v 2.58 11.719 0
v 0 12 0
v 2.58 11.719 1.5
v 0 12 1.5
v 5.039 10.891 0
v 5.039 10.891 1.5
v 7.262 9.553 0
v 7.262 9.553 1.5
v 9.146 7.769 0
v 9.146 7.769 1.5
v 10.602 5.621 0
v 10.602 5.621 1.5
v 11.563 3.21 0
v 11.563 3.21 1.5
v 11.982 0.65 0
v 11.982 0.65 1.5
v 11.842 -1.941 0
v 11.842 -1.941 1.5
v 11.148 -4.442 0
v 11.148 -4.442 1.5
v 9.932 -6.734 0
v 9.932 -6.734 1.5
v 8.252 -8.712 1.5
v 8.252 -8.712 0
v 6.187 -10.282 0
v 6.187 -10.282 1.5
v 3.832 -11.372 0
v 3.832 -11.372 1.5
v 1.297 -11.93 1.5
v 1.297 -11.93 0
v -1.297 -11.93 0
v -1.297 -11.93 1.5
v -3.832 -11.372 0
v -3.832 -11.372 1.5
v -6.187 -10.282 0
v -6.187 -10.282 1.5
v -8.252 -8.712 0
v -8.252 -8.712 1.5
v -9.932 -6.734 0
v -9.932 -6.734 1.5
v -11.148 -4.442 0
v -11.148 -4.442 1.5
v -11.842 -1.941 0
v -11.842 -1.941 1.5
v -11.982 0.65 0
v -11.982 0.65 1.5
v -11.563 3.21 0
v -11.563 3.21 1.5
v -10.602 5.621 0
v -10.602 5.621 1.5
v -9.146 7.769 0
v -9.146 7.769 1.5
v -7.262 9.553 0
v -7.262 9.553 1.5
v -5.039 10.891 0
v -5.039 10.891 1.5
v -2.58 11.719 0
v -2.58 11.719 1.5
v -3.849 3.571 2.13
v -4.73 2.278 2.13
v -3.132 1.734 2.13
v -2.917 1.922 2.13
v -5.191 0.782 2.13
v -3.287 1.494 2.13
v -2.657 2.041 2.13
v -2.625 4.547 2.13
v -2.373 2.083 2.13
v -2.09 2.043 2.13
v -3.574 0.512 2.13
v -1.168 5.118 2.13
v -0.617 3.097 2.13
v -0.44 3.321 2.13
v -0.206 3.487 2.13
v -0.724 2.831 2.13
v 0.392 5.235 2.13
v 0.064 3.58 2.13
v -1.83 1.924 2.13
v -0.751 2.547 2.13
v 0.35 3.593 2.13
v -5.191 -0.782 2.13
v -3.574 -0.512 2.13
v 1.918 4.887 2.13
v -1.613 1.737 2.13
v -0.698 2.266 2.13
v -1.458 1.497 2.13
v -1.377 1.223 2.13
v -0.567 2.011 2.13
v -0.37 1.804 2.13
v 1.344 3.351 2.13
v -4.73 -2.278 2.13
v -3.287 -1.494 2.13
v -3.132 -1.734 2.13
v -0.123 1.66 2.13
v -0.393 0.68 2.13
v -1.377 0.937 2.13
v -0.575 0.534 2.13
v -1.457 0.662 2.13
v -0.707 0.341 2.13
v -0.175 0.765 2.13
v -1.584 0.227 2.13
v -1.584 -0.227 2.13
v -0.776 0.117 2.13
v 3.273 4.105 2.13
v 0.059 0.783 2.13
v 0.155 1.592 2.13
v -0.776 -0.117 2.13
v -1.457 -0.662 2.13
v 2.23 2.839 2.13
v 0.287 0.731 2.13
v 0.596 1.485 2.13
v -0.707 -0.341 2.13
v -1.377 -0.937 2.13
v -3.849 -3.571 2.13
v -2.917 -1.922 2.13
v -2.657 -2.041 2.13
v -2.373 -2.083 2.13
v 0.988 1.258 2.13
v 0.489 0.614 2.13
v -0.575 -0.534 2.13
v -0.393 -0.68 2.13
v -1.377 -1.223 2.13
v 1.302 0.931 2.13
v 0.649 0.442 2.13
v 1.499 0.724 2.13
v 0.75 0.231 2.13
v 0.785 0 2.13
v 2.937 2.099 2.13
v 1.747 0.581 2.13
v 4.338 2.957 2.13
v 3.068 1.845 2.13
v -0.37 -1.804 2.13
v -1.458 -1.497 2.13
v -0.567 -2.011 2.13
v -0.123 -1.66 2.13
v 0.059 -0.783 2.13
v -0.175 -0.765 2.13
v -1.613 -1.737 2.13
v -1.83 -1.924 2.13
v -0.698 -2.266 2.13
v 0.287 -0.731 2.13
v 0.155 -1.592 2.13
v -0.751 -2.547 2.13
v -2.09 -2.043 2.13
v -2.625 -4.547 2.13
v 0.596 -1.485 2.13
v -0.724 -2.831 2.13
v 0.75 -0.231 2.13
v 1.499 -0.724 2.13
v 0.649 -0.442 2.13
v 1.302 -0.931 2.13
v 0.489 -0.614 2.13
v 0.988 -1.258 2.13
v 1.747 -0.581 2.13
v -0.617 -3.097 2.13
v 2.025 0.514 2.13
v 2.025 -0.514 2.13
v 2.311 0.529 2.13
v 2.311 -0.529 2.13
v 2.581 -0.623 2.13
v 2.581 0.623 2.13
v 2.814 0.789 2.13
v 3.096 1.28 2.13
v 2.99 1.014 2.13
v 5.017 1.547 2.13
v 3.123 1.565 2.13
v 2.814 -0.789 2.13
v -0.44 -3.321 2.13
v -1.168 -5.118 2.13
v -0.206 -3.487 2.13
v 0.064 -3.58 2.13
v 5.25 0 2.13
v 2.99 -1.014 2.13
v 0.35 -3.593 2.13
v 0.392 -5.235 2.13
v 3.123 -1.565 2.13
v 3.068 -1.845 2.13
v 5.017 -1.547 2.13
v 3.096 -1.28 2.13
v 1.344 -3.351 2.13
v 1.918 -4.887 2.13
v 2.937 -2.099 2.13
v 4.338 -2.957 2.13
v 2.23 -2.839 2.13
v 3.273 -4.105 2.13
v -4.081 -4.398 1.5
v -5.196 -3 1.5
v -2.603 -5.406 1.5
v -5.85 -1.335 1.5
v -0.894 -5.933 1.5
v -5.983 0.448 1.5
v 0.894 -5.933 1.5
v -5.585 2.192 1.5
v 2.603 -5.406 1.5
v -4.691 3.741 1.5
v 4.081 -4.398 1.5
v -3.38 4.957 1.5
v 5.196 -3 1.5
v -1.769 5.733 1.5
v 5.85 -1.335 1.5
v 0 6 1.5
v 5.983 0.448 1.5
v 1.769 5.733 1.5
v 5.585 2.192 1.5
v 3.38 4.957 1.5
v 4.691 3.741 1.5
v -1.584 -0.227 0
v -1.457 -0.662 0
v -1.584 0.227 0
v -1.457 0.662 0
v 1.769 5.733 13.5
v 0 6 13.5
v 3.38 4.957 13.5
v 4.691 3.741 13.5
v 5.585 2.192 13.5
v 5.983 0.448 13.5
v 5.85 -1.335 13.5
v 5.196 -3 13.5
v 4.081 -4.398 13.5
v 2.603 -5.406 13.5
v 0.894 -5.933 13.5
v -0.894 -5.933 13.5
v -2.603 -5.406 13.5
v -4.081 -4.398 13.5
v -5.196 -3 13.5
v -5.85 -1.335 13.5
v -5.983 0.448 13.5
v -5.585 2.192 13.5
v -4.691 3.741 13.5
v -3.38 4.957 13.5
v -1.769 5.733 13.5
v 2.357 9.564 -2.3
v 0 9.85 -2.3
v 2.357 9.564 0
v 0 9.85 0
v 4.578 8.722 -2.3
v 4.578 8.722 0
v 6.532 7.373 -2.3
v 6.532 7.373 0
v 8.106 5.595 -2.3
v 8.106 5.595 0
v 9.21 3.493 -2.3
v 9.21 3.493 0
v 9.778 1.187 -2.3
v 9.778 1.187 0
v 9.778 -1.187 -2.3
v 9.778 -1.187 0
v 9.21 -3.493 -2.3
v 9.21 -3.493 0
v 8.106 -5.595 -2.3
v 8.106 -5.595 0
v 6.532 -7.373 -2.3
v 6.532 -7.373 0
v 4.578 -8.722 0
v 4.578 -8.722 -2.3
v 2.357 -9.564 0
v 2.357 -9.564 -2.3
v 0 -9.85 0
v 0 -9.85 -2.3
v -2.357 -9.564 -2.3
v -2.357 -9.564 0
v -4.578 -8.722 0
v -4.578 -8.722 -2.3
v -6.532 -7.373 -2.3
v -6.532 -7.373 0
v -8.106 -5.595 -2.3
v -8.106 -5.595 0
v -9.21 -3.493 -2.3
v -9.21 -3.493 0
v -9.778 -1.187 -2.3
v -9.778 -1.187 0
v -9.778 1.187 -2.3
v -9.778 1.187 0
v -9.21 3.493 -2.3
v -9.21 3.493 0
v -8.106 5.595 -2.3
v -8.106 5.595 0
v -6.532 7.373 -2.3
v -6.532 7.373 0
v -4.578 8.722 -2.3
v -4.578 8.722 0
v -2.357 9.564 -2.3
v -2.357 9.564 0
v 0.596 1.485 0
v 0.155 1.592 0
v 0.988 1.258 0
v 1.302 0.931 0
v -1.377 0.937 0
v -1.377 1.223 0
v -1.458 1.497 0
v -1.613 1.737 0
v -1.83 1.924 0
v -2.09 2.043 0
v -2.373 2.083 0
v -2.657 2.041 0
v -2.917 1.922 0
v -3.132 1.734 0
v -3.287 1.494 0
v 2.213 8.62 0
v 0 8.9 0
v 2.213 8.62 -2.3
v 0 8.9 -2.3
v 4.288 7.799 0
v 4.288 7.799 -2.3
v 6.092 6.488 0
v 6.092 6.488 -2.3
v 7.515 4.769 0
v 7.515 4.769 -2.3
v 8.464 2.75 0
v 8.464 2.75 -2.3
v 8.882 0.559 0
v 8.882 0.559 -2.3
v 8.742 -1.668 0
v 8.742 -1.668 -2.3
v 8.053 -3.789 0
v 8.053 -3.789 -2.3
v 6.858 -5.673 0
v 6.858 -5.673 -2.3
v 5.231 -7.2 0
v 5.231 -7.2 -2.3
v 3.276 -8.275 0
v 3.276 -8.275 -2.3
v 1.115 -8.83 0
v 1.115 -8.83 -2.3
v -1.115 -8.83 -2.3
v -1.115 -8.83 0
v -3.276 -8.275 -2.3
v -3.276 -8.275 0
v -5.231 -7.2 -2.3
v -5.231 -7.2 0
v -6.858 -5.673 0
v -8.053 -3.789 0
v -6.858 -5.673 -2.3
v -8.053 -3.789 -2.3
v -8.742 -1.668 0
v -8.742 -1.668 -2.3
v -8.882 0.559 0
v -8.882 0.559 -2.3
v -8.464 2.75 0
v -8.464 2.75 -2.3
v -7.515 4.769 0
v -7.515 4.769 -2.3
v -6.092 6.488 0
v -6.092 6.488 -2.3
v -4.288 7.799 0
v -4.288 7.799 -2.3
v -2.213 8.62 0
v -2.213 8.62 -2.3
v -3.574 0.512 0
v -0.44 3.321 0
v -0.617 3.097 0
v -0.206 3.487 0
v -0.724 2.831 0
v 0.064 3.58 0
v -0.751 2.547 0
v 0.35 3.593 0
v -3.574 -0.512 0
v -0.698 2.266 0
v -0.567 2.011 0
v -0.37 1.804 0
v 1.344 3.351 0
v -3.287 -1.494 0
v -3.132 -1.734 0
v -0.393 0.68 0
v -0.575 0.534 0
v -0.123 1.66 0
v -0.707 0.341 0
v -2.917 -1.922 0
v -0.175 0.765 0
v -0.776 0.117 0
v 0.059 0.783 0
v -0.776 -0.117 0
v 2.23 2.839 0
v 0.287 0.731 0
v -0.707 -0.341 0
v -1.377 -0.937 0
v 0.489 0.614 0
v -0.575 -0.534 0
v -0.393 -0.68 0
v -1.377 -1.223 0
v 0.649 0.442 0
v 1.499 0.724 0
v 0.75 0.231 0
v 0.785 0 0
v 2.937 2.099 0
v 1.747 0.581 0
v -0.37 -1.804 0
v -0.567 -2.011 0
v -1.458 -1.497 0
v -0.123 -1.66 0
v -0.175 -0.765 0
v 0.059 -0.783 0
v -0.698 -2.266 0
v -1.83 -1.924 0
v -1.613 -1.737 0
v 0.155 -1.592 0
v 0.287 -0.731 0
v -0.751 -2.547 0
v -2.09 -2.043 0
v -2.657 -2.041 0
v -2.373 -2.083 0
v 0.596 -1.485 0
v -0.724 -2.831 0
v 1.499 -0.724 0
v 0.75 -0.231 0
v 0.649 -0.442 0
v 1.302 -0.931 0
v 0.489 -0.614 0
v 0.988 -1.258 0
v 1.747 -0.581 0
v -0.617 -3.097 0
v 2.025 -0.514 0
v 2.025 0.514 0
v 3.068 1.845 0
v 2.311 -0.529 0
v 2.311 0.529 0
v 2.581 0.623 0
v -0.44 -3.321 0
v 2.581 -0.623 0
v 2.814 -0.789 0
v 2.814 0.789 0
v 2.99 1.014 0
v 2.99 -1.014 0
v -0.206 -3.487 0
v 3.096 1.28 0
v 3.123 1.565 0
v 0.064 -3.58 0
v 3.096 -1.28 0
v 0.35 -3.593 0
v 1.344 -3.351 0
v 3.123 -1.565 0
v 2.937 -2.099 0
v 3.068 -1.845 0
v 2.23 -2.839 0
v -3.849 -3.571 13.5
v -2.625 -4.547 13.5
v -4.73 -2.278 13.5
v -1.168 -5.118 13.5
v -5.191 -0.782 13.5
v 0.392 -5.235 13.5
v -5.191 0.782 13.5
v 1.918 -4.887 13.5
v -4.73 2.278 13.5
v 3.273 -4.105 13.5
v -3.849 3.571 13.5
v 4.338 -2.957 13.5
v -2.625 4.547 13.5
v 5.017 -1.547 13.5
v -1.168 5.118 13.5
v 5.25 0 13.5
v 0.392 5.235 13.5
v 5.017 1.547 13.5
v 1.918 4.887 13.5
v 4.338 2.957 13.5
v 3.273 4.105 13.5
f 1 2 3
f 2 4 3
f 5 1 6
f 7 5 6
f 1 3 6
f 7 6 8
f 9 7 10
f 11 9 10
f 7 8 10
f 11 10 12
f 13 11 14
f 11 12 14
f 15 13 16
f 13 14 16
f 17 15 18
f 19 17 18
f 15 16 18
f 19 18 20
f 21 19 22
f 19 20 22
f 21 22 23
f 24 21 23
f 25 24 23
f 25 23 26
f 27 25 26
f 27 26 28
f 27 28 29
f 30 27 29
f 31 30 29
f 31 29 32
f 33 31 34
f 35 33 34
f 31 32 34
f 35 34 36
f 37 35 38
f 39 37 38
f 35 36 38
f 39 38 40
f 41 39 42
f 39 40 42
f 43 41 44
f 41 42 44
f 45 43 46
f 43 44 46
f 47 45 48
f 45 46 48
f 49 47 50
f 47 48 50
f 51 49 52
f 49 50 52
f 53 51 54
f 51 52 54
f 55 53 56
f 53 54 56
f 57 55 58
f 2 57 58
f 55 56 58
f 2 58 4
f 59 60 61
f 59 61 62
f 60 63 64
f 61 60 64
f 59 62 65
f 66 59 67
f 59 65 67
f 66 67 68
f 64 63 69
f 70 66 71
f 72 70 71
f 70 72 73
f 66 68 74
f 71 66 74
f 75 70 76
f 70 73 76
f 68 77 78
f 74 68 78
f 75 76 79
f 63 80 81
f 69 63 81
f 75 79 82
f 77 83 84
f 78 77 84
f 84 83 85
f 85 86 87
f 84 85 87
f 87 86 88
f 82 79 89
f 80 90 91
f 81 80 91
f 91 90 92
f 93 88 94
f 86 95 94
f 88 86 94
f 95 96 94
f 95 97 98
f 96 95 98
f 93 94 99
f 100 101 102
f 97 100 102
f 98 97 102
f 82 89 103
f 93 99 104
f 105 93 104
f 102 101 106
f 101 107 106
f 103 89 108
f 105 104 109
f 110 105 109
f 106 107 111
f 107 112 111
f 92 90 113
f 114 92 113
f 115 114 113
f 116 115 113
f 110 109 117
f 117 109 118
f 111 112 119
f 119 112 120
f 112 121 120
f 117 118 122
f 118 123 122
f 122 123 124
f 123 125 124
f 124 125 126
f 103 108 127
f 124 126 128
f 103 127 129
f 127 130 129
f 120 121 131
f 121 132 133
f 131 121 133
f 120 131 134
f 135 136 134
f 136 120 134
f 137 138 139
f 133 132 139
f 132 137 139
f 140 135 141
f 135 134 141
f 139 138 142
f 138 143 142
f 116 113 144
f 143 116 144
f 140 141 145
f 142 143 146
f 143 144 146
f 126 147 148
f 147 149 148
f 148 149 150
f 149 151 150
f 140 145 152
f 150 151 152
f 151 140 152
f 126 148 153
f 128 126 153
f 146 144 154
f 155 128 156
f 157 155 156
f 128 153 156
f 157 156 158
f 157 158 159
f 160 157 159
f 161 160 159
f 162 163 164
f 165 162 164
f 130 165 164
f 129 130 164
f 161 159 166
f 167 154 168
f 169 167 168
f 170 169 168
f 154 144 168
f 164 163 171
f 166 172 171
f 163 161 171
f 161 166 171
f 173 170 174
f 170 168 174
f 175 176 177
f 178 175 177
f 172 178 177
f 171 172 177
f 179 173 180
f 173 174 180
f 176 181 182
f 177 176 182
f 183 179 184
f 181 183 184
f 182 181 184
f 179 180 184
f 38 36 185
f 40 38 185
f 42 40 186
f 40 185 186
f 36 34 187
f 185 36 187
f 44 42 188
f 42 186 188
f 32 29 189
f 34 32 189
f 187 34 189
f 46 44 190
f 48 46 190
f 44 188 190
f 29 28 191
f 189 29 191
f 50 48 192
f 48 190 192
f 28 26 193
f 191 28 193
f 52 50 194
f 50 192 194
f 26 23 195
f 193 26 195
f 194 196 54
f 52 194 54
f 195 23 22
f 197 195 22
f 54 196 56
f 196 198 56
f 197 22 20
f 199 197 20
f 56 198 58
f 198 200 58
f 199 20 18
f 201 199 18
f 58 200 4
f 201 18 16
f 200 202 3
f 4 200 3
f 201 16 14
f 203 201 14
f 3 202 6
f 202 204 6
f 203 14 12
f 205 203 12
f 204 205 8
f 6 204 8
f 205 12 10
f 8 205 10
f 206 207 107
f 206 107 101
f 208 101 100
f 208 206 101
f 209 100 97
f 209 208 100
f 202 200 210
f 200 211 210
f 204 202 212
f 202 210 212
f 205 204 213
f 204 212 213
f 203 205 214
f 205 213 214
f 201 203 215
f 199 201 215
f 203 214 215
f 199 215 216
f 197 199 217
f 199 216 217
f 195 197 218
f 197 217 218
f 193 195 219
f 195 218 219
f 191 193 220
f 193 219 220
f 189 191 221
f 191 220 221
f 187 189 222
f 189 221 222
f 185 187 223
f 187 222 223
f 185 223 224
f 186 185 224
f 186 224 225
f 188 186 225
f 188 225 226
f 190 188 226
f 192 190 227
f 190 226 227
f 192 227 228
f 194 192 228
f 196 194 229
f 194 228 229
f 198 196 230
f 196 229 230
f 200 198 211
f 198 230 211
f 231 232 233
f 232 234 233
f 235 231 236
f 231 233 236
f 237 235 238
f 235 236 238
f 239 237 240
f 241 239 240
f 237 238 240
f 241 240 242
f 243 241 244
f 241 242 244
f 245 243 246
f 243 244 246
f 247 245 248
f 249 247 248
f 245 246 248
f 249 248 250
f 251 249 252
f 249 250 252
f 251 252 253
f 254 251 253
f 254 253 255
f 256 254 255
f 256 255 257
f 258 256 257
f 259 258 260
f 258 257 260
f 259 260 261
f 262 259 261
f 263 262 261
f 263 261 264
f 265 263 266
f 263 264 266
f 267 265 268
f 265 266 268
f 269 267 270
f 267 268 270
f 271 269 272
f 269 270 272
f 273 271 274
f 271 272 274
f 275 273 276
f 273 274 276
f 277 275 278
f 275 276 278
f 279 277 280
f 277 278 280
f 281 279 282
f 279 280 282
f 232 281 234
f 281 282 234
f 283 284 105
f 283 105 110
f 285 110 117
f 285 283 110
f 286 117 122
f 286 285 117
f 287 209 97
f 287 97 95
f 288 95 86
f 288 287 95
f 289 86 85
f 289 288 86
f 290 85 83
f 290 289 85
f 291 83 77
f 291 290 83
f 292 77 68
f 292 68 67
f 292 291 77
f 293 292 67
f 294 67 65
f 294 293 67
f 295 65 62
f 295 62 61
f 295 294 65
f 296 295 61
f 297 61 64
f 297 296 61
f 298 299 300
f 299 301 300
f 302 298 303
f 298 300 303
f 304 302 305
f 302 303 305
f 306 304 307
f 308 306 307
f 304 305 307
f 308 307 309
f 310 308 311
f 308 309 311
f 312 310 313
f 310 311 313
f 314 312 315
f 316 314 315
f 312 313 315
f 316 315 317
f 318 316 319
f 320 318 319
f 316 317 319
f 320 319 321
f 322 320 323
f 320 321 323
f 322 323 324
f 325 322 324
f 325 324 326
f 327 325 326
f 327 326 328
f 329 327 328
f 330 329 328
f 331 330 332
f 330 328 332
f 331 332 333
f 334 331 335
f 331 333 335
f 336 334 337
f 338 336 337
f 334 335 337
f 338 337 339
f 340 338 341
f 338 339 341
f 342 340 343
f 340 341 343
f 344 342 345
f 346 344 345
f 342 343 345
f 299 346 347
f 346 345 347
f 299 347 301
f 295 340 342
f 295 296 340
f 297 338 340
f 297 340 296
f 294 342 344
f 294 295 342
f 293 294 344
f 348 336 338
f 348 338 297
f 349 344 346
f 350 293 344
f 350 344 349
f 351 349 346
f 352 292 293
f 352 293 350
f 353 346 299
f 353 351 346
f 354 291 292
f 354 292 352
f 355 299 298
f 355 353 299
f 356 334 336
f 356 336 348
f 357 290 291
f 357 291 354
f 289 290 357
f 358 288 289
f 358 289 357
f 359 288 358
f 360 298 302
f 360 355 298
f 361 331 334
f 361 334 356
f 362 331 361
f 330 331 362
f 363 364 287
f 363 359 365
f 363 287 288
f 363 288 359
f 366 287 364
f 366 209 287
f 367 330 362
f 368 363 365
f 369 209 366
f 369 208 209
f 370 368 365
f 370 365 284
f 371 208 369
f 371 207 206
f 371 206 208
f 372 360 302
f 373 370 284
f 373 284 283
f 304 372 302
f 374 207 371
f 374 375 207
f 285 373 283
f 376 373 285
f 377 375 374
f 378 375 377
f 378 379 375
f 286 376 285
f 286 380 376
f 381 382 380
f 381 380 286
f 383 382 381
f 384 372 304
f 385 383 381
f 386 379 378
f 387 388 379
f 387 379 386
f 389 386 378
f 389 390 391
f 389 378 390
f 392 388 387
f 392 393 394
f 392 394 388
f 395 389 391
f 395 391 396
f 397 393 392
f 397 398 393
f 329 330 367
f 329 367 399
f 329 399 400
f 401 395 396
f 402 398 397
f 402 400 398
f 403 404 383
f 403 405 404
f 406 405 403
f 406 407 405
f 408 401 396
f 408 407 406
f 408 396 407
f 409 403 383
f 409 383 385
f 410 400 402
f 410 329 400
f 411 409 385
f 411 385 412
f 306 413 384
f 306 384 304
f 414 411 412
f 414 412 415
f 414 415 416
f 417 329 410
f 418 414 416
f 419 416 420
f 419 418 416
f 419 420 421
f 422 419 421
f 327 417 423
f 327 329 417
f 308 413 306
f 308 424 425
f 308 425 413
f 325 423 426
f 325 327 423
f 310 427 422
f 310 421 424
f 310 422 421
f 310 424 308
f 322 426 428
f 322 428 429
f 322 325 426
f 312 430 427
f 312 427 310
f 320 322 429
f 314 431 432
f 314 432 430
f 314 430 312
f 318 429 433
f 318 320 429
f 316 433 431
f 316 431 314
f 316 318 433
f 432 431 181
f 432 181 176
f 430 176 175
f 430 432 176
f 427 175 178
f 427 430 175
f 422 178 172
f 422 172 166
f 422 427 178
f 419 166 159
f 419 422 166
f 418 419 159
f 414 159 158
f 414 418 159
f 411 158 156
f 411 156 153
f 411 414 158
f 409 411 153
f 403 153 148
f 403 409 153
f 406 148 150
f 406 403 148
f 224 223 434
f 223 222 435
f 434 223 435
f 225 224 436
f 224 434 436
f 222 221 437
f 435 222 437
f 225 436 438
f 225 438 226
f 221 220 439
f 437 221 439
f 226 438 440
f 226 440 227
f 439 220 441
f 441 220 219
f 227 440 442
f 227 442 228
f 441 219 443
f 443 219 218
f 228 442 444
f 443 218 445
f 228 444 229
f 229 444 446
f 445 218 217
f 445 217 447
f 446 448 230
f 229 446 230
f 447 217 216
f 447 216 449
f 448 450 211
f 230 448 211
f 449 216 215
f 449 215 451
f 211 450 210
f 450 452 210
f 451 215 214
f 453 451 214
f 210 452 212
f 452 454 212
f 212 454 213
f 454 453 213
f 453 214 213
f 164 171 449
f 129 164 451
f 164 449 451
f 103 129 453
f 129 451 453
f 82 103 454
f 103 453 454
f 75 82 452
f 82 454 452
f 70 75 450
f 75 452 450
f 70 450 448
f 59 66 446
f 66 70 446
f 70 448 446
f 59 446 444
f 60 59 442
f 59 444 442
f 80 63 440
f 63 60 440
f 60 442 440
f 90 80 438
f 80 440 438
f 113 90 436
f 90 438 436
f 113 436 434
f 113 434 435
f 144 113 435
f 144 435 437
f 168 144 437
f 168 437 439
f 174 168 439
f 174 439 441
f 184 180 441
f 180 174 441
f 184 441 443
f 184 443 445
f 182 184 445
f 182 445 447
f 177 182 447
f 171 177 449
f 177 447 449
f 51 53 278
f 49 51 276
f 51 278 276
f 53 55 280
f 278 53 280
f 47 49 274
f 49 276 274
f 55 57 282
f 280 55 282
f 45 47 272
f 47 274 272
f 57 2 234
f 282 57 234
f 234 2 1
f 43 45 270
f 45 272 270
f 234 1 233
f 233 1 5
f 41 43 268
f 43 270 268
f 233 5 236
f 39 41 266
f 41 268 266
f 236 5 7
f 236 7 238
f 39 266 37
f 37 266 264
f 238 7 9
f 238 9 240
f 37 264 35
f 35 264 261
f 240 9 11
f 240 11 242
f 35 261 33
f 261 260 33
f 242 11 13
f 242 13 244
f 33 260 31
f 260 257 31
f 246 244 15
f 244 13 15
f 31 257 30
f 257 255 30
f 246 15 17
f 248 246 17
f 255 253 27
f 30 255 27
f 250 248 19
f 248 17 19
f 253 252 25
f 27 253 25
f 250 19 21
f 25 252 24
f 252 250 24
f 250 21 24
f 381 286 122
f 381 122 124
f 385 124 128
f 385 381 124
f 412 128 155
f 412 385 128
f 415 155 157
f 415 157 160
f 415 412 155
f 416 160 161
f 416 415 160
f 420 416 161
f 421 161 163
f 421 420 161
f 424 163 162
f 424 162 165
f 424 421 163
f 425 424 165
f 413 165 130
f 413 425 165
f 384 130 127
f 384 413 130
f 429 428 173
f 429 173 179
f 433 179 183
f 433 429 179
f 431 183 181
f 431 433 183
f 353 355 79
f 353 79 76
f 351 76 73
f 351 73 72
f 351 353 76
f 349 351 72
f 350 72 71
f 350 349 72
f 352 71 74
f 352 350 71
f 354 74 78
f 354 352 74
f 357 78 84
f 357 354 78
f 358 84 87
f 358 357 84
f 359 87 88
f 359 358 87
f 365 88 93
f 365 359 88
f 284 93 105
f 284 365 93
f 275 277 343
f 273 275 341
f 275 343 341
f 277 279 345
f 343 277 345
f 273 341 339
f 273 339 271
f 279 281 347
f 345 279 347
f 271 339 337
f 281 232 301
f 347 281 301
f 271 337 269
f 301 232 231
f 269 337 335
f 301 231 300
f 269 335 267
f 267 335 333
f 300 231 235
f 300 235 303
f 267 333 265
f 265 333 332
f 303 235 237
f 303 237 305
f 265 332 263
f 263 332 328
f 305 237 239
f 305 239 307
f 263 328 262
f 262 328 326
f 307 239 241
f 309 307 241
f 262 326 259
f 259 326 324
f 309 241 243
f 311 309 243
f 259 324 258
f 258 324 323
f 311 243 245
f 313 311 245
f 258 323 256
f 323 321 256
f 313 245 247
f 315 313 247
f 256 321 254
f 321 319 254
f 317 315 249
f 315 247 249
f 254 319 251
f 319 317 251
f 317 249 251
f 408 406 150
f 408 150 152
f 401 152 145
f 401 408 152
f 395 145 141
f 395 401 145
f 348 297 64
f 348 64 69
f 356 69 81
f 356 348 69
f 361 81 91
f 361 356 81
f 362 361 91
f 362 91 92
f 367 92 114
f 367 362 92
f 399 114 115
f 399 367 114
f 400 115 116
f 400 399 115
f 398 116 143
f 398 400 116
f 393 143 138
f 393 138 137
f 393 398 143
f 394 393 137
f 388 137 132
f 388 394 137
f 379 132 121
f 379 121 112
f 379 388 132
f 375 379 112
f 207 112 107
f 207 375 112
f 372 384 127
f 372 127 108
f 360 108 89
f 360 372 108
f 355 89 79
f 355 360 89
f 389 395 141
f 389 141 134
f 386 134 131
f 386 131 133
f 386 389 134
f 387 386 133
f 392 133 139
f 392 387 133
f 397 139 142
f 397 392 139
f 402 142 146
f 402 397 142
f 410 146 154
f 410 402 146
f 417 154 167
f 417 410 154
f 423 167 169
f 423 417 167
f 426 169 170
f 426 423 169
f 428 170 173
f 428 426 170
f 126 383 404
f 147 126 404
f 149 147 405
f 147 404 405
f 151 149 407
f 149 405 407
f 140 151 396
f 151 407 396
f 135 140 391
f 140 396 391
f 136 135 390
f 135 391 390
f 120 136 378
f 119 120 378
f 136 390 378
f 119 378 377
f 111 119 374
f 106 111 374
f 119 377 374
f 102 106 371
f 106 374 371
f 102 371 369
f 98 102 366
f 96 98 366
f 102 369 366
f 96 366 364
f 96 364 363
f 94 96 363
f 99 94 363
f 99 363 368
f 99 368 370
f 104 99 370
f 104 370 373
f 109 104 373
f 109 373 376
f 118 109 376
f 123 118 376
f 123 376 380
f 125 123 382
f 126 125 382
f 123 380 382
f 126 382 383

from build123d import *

# Parameters (mm, degrees)
F2_R     = 5.25
F3_DEPTH = 15.801
F4_R     = 5.25
F4_R_2   = 0.785
F5_DEPTH = 2.13


with BuildPart() as f1:
    # F0 (on Right) → F1 (revolve)
    with BuildSketch(Plane.YZ):
        Polygon((0, 13.5), (0, 0), (8.9, 0), (8.9, -2.3), (9.85, -2.3), (9.85, 0), (12, 0), (12, 1.5), (6, 1.5), (6, 13.5), align=None)
    revolve(axis=Axis((0, 0, 6.75), (0, 0, -1)))

    # F2 (on face) → F3 (cut, through all)
    with BuildSketch(Plane.XY.offset(13.5)):
        Circle(F2_R)
    extrude(amount=-F3_DEPTH, mode=Mode.SUBTRACT)

    # F4 (on face) → F5 (join)
    with BuildSketch(Plane(origin=(0, 0, 0), x_dir=(1, 0, 0), z_dir=(0, 0, -1))):
        Circle(F4_R)
        with BuildLine():
            ThreePointArc((0.3498486339, -3.5930079228), (-0.7478164186, -2.6901339379), (0.1550575663, -1.5924688855))
            ThreePointArc((0.1550575663, -1.5924688855), (0.8, -1.3856406461), (1.3015897264, -0.9305182342))
            ThreePointArc((1.3015897264, -0.9305182342), (2.7036325391, -0.6974389531), (2.9367118202, -2.0994817658))
            ThreePointArc((2.9367118202, -2.0994817658), (1.805, -3.1263517077), (0.3498486339, -3.5930079228))
        make_face(mode=Mode.SUBTRACT)
        with BuildLine():
            ThreePointArc((-3.2865604541, -1.493526157), (-3.61, 0), (-3.2865604541, 1.493526157))
            ThreePointArc((-3.2865604541, 1.493526157), (-1.9558161205, 1.9926949848), (-1.4566472927, 0.6619506513))
            ThreePointArc((-1.4566472927, 0.6619506513), (-1.6, 0), (-1.4566472927, -0.6619506513))
            ThreePointArc((-1.4566472927, -0.6619506513), (-1.9558161205, -1.9926949848), (-3.2865604541, -1.493526157))
        make_face(mode=Mode.SUBTRACT)
        Circle(F4_R_2, mode=Mode.SUBTRACT)
        with BuildLine():
            ThreePointArc((0.3498486339, 3.5930079228), (1.805, 3.1263517077), (2.9367118202, 2.0994817658))
            ThreePointArc((2.9367118202, 2.0994817658), (2.7036325391, 0.6974389531), (1.3015897264, 0.9305182342))
            ThreePointArc((1.3015897264, 0.9305182342), (0.8, 1.3856406461), (0.1550575663, 1.5924688855))
            ThreePointArc((0.1550575663, 1.5924688855), (-0.7478164186, 2.6901339379), (0.3498486339, 3.5930079228))
        make_face(mode=Mode.SUBTRACT)
    extrude(amount=-F5_DEPTH)


solid = f1.part
